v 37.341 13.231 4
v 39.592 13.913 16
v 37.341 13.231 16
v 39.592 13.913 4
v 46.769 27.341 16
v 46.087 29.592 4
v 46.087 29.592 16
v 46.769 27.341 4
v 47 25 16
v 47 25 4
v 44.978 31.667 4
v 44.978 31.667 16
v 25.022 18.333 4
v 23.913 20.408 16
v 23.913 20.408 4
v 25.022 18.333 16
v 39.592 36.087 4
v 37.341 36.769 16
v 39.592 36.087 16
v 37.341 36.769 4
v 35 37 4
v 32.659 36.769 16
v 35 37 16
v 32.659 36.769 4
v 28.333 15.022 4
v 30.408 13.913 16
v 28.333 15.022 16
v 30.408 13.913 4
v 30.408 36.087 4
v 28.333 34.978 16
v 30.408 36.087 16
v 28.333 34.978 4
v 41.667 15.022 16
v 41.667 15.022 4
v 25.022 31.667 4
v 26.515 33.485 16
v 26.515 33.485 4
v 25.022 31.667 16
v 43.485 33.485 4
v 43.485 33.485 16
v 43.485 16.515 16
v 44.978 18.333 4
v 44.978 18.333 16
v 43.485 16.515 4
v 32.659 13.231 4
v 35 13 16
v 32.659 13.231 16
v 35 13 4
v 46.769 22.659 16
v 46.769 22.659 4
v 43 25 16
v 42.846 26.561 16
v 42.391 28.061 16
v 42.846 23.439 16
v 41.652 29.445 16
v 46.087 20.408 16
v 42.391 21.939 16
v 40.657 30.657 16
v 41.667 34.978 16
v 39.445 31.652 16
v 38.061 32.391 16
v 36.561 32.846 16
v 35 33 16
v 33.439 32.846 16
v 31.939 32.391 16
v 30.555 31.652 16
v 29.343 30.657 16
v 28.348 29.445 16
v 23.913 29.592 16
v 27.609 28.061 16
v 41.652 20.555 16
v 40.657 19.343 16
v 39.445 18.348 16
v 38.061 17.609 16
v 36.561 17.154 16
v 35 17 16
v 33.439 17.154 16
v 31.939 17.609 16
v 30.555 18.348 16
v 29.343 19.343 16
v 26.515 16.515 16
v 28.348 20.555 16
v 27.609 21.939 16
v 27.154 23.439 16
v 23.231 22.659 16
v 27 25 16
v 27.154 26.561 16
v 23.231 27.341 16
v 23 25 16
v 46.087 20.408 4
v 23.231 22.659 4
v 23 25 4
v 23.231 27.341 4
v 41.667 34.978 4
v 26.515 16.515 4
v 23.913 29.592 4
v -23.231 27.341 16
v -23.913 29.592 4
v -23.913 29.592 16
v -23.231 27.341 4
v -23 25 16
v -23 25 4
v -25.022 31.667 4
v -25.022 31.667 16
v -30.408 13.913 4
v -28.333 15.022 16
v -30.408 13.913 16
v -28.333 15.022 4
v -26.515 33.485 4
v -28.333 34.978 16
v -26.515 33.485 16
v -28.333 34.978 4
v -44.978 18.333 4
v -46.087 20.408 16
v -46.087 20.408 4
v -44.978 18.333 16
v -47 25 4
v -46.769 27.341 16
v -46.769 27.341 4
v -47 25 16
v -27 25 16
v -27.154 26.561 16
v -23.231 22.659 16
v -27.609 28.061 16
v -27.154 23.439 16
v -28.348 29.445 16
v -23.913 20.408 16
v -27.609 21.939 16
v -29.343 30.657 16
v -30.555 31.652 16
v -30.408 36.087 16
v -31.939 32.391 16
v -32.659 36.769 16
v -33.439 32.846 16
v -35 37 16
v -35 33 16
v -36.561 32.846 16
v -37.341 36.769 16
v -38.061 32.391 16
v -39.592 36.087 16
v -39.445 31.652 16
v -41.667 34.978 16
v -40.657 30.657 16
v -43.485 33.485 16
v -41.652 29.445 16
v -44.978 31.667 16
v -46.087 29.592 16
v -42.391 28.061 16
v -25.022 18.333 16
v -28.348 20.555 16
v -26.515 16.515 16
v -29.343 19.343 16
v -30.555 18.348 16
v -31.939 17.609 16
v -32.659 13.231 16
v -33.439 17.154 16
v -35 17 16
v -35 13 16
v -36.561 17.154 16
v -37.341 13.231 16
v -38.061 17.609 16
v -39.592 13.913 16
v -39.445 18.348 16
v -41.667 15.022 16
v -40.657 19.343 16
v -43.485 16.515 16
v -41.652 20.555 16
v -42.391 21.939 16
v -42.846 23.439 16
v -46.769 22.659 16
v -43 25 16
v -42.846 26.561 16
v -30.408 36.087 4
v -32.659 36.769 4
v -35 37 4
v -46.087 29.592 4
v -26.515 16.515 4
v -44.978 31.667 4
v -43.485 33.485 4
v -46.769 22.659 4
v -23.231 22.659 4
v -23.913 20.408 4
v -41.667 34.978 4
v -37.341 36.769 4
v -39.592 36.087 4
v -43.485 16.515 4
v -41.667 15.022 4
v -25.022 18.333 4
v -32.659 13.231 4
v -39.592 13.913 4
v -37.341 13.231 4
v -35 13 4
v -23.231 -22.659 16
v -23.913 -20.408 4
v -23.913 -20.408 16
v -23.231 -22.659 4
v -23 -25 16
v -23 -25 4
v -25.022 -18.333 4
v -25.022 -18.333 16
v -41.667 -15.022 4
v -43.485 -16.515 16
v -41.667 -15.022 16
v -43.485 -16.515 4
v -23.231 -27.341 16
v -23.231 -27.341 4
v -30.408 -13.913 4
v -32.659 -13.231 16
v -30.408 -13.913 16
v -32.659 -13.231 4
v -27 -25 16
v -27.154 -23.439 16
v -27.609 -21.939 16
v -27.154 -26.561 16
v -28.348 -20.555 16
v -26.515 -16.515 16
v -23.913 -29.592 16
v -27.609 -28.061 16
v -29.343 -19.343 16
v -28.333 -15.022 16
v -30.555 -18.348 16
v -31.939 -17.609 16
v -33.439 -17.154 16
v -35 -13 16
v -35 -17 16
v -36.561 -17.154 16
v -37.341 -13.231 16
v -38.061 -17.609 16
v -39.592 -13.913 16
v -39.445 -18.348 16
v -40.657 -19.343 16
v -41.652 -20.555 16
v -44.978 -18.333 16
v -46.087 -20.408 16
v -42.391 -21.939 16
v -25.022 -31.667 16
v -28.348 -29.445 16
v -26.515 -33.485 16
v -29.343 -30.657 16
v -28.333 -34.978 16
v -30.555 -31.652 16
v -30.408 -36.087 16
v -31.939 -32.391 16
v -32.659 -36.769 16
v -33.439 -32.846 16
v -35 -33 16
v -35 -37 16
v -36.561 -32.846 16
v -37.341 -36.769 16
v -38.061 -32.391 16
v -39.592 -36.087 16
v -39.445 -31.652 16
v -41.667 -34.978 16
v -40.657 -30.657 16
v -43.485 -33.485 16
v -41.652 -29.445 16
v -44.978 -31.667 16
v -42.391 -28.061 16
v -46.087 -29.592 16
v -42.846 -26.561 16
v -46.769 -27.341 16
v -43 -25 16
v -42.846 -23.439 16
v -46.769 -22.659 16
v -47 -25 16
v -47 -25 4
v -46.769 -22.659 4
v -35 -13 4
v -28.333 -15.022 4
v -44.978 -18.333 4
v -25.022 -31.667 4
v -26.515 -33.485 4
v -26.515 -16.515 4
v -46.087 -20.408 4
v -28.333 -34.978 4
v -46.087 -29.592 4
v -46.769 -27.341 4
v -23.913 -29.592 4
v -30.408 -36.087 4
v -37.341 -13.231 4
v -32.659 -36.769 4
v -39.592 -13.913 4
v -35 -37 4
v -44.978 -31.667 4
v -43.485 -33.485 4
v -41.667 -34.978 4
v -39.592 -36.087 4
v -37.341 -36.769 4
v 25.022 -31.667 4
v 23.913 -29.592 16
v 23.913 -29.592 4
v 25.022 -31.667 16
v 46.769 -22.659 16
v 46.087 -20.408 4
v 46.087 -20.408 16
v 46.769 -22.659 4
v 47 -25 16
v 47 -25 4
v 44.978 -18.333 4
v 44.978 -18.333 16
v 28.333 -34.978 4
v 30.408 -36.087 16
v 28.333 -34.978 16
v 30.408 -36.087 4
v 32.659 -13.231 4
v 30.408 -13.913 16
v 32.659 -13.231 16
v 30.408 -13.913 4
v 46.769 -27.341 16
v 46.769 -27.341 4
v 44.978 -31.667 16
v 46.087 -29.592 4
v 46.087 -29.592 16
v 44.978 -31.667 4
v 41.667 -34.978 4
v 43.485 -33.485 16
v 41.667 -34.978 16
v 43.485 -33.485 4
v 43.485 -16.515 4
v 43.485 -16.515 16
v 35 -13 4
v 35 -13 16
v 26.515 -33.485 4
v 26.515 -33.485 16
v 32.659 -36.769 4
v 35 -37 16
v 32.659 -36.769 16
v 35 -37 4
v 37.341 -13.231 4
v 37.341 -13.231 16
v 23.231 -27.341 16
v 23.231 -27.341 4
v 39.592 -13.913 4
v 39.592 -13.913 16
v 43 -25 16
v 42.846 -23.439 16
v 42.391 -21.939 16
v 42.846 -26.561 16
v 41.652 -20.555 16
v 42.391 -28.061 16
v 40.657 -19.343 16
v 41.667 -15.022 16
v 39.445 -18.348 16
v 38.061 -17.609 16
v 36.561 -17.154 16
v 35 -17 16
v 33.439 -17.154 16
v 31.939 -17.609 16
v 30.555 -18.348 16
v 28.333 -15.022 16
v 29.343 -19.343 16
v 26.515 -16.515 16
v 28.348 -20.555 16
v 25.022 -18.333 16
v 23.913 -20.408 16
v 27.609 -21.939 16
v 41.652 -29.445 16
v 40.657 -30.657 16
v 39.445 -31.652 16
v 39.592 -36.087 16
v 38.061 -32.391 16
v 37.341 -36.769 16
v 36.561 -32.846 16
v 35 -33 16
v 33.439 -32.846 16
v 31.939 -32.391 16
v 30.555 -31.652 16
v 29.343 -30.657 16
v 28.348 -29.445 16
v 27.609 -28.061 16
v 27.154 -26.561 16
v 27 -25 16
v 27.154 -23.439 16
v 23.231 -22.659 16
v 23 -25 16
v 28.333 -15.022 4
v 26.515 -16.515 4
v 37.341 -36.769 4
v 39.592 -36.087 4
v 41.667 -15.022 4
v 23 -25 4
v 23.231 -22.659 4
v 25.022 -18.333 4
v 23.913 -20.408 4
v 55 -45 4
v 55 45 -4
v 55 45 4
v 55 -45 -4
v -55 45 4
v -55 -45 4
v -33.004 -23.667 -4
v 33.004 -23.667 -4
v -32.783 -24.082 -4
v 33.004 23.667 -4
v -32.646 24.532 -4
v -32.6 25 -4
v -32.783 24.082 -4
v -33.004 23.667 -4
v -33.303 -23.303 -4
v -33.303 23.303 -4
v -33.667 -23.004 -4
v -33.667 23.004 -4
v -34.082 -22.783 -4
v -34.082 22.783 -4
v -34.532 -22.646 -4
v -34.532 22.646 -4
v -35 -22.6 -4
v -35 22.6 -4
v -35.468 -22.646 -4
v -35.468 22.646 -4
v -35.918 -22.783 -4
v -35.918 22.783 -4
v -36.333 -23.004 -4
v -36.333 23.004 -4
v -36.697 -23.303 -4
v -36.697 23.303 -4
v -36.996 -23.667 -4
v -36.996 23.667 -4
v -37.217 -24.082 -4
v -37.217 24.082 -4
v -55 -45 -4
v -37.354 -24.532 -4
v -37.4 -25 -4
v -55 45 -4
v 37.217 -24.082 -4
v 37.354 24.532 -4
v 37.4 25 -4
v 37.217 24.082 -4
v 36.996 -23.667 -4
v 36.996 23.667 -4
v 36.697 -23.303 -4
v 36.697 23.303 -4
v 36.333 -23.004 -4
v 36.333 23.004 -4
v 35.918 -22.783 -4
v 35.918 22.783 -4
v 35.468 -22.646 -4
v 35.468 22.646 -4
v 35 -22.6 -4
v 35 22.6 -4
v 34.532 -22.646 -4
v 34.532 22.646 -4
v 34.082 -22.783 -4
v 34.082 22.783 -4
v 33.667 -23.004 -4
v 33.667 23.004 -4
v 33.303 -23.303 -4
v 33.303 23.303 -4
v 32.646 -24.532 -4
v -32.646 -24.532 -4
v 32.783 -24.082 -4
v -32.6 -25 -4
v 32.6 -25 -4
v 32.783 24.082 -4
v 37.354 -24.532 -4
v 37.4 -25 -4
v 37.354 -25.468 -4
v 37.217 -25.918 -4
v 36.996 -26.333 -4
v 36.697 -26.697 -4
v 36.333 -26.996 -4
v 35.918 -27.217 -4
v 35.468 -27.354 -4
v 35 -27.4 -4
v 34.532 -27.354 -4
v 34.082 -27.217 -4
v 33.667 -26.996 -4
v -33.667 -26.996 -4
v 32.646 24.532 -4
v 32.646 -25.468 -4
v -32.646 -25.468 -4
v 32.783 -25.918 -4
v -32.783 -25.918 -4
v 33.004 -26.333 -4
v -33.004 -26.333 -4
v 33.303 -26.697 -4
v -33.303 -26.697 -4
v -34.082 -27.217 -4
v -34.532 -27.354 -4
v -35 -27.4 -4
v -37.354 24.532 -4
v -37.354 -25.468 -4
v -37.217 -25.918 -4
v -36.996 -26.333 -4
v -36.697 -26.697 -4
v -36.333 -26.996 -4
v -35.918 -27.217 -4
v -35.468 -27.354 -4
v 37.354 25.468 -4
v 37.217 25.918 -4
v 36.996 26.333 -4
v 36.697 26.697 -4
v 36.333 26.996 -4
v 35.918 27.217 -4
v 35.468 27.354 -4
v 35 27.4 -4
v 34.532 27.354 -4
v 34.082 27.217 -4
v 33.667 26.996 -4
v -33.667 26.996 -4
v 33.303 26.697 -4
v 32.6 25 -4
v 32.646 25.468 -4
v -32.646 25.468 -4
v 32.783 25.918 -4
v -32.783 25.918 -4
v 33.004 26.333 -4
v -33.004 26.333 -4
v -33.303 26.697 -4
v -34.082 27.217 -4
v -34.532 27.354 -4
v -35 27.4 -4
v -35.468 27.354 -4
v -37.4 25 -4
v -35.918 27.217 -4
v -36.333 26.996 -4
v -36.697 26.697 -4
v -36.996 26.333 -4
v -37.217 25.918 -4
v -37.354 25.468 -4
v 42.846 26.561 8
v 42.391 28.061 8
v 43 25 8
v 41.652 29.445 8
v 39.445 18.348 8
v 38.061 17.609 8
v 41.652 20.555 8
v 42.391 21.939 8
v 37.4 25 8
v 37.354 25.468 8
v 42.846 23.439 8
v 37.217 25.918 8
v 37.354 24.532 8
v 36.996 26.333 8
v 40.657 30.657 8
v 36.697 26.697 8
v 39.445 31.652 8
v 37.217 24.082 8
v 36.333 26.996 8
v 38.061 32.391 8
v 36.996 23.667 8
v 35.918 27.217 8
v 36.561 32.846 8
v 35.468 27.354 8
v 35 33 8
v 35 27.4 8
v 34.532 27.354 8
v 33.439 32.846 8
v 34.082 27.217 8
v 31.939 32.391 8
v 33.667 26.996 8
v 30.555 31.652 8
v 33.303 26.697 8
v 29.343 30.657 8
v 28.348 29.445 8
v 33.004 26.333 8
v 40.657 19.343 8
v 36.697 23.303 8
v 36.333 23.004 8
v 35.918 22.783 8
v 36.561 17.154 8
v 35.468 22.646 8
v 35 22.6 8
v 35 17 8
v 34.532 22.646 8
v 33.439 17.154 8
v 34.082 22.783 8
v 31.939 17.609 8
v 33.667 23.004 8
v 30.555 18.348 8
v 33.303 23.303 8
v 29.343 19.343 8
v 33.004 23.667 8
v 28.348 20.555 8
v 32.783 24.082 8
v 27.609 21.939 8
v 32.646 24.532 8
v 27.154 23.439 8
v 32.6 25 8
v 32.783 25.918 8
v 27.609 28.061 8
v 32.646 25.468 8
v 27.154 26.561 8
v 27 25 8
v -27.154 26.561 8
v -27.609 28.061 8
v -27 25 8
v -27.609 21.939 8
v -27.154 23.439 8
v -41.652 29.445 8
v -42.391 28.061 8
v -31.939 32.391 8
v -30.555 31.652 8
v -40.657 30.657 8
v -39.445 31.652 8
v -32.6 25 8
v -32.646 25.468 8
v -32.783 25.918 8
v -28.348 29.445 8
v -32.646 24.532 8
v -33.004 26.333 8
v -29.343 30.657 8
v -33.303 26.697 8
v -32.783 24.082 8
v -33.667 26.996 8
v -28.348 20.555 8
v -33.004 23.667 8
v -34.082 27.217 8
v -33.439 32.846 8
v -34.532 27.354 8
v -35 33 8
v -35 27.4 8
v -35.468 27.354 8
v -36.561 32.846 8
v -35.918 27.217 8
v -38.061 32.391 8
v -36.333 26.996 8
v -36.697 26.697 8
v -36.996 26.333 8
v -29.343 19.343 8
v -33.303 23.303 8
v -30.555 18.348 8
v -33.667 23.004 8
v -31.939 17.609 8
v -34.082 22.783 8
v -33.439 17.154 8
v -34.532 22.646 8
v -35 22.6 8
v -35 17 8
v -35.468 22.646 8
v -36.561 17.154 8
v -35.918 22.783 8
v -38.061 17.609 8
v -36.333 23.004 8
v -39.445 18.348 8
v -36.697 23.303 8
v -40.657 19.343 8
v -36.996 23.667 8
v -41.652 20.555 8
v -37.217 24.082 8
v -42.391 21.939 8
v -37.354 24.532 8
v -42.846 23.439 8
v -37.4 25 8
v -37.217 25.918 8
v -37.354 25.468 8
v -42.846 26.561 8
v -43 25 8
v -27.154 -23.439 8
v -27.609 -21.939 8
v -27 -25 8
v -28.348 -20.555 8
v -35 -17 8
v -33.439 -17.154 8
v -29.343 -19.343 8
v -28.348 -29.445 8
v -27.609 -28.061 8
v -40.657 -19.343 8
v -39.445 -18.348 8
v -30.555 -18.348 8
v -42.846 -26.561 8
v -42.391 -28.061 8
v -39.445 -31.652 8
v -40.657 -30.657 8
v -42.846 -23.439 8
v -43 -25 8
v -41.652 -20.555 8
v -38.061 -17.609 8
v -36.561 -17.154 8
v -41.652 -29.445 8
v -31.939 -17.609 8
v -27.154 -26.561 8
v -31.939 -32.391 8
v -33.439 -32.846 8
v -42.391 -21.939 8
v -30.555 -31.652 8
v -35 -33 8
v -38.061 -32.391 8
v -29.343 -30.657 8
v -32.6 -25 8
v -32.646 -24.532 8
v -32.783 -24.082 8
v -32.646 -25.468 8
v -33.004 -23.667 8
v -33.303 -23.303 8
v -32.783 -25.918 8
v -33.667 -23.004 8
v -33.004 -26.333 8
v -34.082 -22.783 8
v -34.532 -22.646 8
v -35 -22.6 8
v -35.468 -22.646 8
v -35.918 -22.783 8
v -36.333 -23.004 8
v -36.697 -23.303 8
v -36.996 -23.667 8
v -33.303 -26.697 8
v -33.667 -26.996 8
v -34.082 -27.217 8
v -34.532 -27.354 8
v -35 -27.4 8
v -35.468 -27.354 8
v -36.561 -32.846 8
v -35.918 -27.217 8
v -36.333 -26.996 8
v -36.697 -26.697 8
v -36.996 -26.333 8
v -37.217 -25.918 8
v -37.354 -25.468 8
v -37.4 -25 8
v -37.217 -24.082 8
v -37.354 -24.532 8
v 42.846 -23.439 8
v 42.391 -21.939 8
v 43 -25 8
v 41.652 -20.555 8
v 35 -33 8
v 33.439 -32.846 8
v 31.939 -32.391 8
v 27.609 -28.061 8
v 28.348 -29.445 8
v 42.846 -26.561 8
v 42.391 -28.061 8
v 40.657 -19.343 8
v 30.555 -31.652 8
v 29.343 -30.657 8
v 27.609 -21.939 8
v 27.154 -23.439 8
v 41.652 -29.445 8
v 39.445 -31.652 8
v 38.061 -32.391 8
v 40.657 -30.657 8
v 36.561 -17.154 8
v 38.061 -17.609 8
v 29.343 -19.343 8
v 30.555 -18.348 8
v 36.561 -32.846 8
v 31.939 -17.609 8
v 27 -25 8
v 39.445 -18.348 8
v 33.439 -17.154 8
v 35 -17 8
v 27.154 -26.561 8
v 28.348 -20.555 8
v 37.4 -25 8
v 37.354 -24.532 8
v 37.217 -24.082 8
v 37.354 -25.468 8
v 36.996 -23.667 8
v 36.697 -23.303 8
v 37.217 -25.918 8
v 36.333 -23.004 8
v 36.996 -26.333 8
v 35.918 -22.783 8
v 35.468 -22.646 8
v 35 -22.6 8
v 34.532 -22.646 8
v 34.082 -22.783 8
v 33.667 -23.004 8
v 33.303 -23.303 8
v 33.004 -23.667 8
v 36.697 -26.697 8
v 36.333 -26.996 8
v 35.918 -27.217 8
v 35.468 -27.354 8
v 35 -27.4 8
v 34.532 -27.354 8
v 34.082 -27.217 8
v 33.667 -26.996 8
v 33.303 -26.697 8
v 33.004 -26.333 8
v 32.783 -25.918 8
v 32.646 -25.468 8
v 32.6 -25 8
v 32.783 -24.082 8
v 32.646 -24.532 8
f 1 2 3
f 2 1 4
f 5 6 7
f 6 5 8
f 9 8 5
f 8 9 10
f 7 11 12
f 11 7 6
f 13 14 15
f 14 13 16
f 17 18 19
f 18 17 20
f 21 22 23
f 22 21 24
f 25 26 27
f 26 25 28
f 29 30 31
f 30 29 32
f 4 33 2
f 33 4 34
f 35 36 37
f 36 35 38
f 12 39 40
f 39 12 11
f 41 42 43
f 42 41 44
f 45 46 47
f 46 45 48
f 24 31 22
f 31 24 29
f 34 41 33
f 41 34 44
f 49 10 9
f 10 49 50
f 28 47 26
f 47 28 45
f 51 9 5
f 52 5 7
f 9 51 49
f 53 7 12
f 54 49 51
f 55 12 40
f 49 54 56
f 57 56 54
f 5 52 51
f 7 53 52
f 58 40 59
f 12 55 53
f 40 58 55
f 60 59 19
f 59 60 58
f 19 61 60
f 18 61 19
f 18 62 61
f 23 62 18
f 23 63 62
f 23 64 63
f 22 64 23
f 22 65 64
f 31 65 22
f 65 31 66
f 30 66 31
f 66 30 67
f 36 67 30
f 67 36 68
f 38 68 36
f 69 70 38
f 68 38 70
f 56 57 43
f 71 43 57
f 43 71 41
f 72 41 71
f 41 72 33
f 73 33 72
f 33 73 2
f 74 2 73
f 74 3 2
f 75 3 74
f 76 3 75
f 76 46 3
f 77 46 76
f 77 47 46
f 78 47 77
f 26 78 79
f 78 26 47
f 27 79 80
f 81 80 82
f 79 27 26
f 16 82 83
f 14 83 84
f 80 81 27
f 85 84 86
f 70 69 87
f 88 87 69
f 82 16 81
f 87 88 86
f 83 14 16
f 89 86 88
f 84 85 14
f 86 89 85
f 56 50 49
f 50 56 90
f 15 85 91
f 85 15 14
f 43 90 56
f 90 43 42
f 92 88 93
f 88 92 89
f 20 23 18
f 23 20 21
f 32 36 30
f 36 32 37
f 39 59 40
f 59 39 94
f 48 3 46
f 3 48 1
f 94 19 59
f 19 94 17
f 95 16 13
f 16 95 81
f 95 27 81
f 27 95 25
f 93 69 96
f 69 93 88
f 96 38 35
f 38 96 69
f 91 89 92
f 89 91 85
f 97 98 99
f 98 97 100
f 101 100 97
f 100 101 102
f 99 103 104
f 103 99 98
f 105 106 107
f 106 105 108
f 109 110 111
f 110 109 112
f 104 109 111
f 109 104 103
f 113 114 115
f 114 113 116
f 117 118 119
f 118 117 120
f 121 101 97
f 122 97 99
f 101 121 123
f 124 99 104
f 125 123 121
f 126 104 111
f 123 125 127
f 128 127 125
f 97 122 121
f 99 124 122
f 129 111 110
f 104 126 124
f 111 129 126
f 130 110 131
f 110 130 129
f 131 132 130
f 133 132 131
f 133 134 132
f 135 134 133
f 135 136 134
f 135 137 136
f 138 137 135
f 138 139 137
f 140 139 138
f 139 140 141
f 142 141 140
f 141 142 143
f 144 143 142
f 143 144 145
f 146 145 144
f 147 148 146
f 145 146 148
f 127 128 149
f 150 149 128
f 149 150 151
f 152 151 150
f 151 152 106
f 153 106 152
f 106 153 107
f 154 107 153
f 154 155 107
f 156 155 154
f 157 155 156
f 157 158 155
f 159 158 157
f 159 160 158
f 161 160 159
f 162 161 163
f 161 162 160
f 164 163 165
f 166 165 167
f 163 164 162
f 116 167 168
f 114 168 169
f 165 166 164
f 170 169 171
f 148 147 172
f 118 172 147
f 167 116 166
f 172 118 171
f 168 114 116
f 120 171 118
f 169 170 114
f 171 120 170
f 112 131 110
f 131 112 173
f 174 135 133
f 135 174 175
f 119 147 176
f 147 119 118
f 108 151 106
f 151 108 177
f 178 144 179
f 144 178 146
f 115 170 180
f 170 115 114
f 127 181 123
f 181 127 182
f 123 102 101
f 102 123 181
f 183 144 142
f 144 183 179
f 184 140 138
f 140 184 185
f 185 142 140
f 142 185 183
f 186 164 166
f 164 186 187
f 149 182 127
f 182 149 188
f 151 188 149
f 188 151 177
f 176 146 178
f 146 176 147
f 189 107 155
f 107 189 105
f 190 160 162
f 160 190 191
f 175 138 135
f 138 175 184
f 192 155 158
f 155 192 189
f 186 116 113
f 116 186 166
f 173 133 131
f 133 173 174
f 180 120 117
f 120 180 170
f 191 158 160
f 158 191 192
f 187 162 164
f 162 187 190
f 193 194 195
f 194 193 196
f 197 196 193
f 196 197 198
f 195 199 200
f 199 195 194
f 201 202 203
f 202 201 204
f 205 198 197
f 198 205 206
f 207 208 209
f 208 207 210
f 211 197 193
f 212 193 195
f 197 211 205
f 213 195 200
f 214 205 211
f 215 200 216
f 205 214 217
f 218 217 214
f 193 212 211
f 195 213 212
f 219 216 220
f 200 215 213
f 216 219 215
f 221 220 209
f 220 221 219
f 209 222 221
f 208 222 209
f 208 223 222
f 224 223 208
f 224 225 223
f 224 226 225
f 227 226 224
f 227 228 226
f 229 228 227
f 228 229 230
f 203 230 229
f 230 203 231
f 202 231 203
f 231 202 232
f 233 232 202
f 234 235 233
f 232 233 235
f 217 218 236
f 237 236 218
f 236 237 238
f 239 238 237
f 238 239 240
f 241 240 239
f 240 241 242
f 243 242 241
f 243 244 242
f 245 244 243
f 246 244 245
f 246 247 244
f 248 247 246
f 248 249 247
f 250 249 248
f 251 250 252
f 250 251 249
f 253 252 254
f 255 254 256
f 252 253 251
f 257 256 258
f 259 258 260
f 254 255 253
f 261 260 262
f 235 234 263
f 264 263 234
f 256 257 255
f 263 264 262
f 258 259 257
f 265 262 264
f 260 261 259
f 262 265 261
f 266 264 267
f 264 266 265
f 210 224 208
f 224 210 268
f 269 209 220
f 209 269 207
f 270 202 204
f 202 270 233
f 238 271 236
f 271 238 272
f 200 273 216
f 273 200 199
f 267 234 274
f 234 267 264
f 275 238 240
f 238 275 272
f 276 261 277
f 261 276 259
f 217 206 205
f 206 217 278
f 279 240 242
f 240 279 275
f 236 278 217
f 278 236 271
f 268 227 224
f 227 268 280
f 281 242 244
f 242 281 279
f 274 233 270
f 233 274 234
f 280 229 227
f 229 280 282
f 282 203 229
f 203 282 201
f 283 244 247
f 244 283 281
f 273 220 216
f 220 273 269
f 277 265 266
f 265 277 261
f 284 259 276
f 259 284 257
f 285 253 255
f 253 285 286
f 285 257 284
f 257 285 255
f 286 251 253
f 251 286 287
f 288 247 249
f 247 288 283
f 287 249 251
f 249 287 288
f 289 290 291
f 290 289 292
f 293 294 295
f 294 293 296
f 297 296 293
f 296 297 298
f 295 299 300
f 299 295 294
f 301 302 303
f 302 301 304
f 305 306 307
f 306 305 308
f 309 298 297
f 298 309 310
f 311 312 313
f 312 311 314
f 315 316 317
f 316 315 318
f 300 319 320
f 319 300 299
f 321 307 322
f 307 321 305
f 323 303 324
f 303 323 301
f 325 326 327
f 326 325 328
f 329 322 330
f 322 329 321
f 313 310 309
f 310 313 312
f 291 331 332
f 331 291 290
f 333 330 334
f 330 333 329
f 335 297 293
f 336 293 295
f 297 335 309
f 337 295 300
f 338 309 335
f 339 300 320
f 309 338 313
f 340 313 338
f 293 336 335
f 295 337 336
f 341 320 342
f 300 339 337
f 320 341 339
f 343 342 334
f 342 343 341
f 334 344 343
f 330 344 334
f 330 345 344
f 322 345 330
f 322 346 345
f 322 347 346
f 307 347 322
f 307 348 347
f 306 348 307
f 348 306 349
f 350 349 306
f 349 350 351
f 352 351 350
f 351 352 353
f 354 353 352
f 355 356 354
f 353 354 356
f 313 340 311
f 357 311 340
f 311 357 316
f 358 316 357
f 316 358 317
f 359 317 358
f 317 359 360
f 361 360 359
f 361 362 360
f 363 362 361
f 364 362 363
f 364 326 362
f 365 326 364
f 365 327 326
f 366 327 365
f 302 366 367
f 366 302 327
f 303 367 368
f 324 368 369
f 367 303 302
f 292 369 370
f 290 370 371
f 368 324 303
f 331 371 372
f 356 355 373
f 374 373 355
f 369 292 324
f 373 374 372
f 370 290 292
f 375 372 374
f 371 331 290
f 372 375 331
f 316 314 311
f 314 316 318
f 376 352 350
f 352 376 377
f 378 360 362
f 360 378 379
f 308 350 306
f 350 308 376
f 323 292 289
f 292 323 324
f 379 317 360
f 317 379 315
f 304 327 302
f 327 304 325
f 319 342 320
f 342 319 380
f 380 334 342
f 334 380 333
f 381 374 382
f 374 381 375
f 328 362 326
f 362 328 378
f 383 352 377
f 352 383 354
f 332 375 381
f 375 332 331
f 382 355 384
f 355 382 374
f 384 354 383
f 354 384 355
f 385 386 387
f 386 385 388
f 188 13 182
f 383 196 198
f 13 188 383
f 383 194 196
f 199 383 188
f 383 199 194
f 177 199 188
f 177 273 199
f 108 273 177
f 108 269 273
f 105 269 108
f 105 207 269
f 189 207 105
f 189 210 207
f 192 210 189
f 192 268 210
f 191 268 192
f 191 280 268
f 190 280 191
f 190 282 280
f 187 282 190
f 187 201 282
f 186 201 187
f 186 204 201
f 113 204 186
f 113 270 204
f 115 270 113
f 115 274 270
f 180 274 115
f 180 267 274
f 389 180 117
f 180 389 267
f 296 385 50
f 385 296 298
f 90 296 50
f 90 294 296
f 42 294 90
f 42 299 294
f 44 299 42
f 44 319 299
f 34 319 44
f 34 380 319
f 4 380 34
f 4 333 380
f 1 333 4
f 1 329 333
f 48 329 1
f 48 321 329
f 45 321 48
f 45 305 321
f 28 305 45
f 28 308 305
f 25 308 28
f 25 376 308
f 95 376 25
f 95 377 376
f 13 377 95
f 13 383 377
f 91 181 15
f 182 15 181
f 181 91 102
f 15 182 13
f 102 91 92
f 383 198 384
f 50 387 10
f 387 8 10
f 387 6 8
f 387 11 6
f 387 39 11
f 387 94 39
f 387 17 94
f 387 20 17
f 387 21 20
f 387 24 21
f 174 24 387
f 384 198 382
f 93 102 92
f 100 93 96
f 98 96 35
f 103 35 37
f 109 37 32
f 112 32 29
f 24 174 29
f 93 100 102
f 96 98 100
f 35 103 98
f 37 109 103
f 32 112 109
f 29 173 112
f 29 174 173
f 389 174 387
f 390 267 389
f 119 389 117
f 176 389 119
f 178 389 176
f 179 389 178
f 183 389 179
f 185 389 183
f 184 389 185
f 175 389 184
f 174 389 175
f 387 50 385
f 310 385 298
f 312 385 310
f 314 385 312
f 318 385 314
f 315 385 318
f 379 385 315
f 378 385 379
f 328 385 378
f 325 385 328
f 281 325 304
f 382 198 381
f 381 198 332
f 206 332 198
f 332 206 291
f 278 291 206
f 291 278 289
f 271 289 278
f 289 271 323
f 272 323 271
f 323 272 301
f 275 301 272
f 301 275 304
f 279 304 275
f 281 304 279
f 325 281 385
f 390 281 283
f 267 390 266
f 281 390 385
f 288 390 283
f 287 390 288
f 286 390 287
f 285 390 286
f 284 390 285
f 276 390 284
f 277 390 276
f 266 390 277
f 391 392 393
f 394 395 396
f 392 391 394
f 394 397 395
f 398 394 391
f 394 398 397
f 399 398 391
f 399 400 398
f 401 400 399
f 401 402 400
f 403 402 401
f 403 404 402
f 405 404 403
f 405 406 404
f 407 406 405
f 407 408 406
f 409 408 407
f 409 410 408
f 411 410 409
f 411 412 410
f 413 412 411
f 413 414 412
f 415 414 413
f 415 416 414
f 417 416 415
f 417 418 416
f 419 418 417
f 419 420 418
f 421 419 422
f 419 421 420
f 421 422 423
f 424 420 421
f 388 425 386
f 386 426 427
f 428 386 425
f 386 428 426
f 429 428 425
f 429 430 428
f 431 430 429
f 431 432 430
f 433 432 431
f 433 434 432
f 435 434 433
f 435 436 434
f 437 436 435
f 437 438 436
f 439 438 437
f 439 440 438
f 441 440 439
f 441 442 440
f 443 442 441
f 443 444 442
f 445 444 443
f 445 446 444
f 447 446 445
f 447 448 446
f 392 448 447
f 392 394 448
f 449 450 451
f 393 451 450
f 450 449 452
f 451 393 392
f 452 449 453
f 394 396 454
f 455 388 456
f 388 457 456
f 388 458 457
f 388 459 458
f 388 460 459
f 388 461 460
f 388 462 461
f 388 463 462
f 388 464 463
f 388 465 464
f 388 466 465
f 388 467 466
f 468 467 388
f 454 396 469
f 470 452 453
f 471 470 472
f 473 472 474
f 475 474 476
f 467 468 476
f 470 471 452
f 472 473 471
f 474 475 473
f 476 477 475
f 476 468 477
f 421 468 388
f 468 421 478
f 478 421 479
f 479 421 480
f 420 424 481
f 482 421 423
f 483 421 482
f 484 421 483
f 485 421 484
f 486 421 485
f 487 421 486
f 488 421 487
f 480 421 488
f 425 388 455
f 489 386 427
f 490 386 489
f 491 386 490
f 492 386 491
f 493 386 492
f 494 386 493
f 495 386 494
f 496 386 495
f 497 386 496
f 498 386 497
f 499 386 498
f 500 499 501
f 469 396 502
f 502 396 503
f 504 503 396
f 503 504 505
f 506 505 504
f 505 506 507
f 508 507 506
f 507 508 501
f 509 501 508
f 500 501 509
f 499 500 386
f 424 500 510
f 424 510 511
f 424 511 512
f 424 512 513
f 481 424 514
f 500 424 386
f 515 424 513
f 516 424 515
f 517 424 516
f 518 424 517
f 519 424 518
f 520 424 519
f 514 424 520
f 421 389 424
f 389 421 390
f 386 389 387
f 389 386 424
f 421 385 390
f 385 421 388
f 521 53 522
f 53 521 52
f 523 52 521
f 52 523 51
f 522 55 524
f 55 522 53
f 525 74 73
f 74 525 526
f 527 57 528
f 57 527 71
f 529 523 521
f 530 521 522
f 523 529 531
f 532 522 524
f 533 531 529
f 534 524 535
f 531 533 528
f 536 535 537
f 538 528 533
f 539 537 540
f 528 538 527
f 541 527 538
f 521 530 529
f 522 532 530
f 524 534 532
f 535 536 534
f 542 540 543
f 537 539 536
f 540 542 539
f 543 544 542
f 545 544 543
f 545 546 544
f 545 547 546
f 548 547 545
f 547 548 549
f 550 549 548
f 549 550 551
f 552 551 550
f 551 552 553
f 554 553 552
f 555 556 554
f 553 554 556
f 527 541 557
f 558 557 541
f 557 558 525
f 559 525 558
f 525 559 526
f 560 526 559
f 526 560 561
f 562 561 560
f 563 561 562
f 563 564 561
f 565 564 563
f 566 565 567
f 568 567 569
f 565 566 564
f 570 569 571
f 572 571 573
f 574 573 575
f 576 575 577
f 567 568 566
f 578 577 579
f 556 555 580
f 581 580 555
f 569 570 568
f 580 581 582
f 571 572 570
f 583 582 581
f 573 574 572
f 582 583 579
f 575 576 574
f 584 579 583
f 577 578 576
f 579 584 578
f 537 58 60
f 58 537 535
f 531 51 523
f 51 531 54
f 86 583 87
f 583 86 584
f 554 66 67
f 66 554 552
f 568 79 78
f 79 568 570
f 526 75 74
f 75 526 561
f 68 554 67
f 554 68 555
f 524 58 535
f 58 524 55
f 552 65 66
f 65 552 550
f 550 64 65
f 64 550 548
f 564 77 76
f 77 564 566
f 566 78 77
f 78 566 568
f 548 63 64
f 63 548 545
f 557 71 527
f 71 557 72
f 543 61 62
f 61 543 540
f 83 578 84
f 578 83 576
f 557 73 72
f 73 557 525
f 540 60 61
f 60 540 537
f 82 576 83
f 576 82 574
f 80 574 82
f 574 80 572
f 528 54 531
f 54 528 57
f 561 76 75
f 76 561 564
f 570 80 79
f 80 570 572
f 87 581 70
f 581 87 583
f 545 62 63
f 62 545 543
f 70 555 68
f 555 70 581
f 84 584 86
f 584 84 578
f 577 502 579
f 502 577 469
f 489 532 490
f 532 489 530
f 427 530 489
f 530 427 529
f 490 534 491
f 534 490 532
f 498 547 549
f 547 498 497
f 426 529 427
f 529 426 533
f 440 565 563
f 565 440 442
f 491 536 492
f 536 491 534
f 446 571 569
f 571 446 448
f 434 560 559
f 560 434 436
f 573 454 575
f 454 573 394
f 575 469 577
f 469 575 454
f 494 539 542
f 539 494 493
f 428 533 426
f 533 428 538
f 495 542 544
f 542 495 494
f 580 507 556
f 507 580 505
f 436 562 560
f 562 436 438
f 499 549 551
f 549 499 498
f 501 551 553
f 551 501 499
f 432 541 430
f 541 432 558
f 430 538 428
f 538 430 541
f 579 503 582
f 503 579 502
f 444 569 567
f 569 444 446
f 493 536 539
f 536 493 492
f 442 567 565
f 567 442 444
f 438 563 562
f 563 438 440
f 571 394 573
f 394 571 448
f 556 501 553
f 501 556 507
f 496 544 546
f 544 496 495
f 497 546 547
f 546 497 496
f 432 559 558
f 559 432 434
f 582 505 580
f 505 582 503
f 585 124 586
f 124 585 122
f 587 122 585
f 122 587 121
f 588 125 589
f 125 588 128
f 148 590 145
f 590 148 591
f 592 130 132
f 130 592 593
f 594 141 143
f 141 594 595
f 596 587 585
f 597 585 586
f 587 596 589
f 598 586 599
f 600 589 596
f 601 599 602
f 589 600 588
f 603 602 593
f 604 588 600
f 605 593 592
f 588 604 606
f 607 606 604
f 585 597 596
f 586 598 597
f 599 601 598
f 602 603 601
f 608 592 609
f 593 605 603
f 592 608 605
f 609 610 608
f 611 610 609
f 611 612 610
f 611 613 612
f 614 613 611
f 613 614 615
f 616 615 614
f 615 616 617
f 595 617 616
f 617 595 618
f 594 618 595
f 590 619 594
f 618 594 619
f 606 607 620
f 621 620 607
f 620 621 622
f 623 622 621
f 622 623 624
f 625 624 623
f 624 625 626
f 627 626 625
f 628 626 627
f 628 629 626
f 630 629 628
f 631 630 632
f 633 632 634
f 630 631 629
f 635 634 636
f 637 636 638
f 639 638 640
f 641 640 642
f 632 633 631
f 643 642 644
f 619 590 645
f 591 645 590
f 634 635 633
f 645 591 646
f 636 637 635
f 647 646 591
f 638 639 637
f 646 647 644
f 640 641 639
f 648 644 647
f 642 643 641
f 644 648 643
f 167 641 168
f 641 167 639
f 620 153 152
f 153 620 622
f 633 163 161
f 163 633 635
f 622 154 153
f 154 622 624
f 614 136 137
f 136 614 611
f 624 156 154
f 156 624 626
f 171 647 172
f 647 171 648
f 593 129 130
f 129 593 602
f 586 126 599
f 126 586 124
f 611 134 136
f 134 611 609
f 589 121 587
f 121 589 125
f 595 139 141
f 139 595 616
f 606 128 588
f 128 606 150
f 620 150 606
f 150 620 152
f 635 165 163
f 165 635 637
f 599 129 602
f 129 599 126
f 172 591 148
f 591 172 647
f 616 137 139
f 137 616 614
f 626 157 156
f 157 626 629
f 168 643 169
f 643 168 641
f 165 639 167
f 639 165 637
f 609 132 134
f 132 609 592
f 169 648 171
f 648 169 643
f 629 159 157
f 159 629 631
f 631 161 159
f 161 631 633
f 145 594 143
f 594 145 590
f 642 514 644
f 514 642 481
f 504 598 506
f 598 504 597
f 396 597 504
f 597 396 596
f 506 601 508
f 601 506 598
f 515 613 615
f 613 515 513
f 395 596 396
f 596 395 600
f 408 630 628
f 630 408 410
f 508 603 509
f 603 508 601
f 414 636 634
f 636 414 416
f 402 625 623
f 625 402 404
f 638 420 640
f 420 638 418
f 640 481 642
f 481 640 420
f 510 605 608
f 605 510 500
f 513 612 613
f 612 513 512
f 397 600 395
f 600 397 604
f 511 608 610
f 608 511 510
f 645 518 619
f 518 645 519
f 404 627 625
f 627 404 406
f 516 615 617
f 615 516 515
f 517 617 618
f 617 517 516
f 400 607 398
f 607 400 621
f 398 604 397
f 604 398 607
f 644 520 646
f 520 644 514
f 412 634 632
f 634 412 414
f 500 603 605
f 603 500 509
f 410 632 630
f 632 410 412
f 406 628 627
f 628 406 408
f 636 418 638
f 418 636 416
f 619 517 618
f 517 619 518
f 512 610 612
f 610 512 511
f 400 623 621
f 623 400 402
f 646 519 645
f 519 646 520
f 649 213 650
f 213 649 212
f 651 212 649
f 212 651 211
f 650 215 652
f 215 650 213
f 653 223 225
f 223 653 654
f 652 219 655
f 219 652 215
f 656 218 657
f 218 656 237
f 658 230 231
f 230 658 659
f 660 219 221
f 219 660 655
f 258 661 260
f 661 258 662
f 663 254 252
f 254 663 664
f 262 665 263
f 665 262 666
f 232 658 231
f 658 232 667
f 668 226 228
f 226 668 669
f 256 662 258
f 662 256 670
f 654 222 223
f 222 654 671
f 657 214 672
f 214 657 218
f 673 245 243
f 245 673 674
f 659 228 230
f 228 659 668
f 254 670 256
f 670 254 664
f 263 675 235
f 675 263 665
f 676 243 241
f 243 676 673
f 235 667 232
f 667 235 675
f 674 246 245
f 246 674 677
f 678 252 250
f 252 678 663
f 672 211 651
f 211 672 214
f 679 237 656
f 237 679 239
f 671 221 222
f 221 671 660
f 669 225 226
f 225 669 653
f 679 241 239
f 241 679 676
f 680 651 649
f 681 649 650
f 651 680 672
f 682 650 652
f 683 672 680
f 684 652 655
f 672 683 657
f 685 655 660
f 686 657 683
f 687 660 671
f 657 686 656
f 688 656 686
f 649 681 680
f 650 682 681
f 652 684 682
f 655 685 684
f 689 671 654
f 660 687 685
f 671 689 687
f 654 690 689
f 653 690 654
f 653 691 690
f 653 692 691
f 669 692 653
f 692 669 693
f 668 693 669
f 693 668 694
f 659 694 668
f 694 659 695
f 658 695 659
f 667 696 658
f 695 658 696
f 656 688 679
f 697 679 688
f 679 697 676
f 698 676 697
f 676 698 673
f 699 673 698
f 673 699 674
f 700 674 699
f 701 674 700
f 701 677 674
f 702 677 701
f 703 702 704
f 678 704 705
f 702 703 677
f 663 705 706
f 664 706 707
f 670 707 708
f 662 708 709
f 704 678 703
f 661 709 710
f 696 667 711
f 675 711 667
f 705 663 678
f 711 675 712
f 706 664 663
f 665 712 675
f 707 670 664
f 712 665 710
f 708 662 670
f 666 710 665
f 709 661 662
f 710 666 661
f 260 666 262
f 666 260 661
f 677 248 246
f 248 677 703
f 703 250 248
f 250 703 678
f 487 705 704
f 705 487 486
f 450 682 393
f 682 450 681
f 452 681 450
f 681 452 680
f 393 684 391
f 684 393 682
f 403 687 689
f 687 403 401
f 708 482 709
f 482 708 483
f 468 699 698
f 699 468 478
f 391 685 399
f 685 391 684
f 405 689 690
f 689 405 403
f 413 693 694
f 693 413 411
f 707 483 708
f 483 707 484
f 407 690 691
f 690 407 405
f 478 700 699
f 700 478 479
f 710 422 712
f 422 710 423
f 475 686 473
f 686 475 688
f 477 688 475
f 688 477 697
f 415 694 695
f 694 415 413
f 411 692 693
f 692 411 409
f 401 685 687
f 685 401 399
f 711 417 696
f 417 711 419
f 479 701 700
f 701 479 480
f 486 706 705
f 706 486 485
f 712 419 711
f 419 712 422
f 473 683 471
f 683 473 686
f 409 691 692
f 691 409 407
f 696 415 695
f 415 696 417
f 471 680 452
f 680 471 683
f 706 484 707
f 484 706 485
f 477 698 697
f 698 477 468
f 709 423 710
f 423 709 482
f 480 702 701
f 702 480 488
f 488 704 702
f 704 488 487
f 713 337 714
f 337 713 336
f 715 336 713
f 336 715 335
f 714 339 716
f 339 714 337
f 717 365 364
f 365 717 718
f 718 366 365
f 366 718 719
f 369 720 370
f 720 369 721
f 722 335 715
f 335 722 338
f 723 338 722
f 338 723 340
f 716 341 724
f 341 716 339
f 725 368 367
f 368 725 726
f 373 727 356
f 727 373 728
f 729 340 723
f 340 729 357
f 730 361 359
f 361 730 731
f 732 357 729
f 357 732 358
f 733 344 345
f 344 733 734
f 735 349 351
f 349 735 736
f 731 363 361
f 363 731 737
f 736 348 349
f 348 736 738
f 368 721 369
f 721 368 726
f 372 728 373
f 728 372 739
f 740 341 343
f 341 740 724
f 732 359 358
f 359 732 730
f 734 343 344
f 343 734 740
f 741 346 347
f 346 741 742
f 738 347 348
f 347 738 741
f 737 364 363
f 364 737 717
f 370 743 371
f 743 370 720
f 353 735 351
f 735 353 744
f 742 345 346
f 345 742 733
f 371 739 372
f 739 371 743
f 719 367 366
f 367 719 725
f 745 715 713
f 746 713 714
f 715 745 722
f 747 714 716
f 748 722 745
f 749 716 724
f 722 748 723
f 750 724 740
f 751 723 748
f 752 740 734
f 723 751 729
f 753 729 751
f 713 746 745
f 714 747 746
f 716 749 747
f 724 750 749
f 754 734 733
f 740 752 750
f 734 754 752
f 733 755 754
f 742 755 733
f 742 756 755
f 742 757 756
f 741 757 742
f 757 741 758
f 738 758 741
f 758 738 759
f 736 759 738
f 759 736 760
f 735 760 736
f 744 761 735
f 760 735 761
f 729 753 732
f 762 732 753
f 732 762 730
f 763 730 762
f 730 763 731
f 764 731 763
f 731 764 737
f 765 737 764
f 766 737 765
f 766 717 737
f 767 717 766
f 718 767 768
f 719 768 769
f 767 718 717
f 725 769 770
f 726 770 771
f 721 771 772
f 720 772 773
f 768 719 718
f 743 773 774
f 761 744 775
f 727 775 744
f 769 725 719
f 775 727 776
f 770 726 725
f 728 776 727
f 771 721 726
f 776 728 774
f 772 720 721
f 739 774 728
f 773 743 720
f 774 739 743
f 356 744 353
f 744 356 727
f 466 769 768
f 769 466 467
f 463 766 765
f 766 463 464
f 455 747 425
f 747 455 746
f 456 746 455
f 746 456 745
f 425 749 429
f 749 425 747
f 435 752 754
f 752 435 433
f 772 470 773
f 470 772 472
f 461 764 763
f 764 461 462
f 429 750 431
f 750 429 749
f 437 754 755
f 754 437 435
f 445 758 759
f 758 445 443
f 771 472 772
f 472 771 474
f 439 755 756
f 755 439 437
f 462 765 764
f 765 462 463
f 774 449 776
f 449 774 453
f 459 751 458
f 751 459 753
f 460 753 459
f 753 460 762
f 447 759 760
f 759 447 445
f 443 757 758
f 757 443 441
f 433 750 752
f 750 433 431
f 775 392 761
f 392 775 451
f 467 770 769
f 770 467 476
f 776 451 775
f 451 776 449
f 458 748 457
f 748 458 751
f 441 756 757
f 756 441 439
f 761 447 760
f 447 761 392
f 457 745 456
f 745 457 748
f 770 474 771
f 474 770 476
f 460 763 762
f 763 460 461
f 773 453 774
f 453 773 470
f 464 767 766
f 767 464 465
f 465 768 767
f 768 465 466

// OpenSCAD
$fn = 32;

// ----------------------------------------------------------------------
// Socket pad plate
// bosses with counterbored sockets for the screws
// ----------------------------------------------------------------------

// --- parameters (mm) ---
base_t = 8;            // base plate thickness
boss_h = 12;           // boss height above the base plate
boss_d = 24;           // boss diameter
socket_d = 16;         // socket diameter
socket_depth = 8;      // socket depth from the boss face
bolt_d = 4.8;          // screw clearance hole through the socket floor
plate = [110, 90, 8];  // overall size (x, y, z)
edge = 20;             // boss centre offset from the plate edge
pads = 4;              // boss count, one per corner

// --- derived feature positions (mm) ---
height = base_t + boss_h;        // = 20   overall height of the part
corner_x = plate[0] / 2 - edge;  // = 35   boss centre X
corner_y = plate[1] / 2 - edge;  // = 25   boss centre Y
feature_centers = [
  [corner_x, corner_y],
  [-corner_x, corner_y],
  [-corner_x, -corner_y],
  [corner_x, -corner_y]
];   // boss centres: sockets, holes and the pads themselves are placed from here

// base plate, bosses on feature_centers, socket + through hole in each
difference() {
  union() {
    cube(plate, center = true);
    for (centre = feature_centers)
      translate([centre[0], centre[1], plate[2] / 2 - 1])
        cylinder(d = boss_d, h = boss_h + 1);
  }
  for (centre = feature_centers) {
    translate([centre[0], centre[1], plate[2] / 2 + boss_h - socket_depth])
      cylinder(d = socket_d, h = socket_depth + 1);
    translate([centre[0], centre[1], -height])
      cylinder(d = bolt_d, h = 2 * height + 2);  // through the socket floor
  }
}
